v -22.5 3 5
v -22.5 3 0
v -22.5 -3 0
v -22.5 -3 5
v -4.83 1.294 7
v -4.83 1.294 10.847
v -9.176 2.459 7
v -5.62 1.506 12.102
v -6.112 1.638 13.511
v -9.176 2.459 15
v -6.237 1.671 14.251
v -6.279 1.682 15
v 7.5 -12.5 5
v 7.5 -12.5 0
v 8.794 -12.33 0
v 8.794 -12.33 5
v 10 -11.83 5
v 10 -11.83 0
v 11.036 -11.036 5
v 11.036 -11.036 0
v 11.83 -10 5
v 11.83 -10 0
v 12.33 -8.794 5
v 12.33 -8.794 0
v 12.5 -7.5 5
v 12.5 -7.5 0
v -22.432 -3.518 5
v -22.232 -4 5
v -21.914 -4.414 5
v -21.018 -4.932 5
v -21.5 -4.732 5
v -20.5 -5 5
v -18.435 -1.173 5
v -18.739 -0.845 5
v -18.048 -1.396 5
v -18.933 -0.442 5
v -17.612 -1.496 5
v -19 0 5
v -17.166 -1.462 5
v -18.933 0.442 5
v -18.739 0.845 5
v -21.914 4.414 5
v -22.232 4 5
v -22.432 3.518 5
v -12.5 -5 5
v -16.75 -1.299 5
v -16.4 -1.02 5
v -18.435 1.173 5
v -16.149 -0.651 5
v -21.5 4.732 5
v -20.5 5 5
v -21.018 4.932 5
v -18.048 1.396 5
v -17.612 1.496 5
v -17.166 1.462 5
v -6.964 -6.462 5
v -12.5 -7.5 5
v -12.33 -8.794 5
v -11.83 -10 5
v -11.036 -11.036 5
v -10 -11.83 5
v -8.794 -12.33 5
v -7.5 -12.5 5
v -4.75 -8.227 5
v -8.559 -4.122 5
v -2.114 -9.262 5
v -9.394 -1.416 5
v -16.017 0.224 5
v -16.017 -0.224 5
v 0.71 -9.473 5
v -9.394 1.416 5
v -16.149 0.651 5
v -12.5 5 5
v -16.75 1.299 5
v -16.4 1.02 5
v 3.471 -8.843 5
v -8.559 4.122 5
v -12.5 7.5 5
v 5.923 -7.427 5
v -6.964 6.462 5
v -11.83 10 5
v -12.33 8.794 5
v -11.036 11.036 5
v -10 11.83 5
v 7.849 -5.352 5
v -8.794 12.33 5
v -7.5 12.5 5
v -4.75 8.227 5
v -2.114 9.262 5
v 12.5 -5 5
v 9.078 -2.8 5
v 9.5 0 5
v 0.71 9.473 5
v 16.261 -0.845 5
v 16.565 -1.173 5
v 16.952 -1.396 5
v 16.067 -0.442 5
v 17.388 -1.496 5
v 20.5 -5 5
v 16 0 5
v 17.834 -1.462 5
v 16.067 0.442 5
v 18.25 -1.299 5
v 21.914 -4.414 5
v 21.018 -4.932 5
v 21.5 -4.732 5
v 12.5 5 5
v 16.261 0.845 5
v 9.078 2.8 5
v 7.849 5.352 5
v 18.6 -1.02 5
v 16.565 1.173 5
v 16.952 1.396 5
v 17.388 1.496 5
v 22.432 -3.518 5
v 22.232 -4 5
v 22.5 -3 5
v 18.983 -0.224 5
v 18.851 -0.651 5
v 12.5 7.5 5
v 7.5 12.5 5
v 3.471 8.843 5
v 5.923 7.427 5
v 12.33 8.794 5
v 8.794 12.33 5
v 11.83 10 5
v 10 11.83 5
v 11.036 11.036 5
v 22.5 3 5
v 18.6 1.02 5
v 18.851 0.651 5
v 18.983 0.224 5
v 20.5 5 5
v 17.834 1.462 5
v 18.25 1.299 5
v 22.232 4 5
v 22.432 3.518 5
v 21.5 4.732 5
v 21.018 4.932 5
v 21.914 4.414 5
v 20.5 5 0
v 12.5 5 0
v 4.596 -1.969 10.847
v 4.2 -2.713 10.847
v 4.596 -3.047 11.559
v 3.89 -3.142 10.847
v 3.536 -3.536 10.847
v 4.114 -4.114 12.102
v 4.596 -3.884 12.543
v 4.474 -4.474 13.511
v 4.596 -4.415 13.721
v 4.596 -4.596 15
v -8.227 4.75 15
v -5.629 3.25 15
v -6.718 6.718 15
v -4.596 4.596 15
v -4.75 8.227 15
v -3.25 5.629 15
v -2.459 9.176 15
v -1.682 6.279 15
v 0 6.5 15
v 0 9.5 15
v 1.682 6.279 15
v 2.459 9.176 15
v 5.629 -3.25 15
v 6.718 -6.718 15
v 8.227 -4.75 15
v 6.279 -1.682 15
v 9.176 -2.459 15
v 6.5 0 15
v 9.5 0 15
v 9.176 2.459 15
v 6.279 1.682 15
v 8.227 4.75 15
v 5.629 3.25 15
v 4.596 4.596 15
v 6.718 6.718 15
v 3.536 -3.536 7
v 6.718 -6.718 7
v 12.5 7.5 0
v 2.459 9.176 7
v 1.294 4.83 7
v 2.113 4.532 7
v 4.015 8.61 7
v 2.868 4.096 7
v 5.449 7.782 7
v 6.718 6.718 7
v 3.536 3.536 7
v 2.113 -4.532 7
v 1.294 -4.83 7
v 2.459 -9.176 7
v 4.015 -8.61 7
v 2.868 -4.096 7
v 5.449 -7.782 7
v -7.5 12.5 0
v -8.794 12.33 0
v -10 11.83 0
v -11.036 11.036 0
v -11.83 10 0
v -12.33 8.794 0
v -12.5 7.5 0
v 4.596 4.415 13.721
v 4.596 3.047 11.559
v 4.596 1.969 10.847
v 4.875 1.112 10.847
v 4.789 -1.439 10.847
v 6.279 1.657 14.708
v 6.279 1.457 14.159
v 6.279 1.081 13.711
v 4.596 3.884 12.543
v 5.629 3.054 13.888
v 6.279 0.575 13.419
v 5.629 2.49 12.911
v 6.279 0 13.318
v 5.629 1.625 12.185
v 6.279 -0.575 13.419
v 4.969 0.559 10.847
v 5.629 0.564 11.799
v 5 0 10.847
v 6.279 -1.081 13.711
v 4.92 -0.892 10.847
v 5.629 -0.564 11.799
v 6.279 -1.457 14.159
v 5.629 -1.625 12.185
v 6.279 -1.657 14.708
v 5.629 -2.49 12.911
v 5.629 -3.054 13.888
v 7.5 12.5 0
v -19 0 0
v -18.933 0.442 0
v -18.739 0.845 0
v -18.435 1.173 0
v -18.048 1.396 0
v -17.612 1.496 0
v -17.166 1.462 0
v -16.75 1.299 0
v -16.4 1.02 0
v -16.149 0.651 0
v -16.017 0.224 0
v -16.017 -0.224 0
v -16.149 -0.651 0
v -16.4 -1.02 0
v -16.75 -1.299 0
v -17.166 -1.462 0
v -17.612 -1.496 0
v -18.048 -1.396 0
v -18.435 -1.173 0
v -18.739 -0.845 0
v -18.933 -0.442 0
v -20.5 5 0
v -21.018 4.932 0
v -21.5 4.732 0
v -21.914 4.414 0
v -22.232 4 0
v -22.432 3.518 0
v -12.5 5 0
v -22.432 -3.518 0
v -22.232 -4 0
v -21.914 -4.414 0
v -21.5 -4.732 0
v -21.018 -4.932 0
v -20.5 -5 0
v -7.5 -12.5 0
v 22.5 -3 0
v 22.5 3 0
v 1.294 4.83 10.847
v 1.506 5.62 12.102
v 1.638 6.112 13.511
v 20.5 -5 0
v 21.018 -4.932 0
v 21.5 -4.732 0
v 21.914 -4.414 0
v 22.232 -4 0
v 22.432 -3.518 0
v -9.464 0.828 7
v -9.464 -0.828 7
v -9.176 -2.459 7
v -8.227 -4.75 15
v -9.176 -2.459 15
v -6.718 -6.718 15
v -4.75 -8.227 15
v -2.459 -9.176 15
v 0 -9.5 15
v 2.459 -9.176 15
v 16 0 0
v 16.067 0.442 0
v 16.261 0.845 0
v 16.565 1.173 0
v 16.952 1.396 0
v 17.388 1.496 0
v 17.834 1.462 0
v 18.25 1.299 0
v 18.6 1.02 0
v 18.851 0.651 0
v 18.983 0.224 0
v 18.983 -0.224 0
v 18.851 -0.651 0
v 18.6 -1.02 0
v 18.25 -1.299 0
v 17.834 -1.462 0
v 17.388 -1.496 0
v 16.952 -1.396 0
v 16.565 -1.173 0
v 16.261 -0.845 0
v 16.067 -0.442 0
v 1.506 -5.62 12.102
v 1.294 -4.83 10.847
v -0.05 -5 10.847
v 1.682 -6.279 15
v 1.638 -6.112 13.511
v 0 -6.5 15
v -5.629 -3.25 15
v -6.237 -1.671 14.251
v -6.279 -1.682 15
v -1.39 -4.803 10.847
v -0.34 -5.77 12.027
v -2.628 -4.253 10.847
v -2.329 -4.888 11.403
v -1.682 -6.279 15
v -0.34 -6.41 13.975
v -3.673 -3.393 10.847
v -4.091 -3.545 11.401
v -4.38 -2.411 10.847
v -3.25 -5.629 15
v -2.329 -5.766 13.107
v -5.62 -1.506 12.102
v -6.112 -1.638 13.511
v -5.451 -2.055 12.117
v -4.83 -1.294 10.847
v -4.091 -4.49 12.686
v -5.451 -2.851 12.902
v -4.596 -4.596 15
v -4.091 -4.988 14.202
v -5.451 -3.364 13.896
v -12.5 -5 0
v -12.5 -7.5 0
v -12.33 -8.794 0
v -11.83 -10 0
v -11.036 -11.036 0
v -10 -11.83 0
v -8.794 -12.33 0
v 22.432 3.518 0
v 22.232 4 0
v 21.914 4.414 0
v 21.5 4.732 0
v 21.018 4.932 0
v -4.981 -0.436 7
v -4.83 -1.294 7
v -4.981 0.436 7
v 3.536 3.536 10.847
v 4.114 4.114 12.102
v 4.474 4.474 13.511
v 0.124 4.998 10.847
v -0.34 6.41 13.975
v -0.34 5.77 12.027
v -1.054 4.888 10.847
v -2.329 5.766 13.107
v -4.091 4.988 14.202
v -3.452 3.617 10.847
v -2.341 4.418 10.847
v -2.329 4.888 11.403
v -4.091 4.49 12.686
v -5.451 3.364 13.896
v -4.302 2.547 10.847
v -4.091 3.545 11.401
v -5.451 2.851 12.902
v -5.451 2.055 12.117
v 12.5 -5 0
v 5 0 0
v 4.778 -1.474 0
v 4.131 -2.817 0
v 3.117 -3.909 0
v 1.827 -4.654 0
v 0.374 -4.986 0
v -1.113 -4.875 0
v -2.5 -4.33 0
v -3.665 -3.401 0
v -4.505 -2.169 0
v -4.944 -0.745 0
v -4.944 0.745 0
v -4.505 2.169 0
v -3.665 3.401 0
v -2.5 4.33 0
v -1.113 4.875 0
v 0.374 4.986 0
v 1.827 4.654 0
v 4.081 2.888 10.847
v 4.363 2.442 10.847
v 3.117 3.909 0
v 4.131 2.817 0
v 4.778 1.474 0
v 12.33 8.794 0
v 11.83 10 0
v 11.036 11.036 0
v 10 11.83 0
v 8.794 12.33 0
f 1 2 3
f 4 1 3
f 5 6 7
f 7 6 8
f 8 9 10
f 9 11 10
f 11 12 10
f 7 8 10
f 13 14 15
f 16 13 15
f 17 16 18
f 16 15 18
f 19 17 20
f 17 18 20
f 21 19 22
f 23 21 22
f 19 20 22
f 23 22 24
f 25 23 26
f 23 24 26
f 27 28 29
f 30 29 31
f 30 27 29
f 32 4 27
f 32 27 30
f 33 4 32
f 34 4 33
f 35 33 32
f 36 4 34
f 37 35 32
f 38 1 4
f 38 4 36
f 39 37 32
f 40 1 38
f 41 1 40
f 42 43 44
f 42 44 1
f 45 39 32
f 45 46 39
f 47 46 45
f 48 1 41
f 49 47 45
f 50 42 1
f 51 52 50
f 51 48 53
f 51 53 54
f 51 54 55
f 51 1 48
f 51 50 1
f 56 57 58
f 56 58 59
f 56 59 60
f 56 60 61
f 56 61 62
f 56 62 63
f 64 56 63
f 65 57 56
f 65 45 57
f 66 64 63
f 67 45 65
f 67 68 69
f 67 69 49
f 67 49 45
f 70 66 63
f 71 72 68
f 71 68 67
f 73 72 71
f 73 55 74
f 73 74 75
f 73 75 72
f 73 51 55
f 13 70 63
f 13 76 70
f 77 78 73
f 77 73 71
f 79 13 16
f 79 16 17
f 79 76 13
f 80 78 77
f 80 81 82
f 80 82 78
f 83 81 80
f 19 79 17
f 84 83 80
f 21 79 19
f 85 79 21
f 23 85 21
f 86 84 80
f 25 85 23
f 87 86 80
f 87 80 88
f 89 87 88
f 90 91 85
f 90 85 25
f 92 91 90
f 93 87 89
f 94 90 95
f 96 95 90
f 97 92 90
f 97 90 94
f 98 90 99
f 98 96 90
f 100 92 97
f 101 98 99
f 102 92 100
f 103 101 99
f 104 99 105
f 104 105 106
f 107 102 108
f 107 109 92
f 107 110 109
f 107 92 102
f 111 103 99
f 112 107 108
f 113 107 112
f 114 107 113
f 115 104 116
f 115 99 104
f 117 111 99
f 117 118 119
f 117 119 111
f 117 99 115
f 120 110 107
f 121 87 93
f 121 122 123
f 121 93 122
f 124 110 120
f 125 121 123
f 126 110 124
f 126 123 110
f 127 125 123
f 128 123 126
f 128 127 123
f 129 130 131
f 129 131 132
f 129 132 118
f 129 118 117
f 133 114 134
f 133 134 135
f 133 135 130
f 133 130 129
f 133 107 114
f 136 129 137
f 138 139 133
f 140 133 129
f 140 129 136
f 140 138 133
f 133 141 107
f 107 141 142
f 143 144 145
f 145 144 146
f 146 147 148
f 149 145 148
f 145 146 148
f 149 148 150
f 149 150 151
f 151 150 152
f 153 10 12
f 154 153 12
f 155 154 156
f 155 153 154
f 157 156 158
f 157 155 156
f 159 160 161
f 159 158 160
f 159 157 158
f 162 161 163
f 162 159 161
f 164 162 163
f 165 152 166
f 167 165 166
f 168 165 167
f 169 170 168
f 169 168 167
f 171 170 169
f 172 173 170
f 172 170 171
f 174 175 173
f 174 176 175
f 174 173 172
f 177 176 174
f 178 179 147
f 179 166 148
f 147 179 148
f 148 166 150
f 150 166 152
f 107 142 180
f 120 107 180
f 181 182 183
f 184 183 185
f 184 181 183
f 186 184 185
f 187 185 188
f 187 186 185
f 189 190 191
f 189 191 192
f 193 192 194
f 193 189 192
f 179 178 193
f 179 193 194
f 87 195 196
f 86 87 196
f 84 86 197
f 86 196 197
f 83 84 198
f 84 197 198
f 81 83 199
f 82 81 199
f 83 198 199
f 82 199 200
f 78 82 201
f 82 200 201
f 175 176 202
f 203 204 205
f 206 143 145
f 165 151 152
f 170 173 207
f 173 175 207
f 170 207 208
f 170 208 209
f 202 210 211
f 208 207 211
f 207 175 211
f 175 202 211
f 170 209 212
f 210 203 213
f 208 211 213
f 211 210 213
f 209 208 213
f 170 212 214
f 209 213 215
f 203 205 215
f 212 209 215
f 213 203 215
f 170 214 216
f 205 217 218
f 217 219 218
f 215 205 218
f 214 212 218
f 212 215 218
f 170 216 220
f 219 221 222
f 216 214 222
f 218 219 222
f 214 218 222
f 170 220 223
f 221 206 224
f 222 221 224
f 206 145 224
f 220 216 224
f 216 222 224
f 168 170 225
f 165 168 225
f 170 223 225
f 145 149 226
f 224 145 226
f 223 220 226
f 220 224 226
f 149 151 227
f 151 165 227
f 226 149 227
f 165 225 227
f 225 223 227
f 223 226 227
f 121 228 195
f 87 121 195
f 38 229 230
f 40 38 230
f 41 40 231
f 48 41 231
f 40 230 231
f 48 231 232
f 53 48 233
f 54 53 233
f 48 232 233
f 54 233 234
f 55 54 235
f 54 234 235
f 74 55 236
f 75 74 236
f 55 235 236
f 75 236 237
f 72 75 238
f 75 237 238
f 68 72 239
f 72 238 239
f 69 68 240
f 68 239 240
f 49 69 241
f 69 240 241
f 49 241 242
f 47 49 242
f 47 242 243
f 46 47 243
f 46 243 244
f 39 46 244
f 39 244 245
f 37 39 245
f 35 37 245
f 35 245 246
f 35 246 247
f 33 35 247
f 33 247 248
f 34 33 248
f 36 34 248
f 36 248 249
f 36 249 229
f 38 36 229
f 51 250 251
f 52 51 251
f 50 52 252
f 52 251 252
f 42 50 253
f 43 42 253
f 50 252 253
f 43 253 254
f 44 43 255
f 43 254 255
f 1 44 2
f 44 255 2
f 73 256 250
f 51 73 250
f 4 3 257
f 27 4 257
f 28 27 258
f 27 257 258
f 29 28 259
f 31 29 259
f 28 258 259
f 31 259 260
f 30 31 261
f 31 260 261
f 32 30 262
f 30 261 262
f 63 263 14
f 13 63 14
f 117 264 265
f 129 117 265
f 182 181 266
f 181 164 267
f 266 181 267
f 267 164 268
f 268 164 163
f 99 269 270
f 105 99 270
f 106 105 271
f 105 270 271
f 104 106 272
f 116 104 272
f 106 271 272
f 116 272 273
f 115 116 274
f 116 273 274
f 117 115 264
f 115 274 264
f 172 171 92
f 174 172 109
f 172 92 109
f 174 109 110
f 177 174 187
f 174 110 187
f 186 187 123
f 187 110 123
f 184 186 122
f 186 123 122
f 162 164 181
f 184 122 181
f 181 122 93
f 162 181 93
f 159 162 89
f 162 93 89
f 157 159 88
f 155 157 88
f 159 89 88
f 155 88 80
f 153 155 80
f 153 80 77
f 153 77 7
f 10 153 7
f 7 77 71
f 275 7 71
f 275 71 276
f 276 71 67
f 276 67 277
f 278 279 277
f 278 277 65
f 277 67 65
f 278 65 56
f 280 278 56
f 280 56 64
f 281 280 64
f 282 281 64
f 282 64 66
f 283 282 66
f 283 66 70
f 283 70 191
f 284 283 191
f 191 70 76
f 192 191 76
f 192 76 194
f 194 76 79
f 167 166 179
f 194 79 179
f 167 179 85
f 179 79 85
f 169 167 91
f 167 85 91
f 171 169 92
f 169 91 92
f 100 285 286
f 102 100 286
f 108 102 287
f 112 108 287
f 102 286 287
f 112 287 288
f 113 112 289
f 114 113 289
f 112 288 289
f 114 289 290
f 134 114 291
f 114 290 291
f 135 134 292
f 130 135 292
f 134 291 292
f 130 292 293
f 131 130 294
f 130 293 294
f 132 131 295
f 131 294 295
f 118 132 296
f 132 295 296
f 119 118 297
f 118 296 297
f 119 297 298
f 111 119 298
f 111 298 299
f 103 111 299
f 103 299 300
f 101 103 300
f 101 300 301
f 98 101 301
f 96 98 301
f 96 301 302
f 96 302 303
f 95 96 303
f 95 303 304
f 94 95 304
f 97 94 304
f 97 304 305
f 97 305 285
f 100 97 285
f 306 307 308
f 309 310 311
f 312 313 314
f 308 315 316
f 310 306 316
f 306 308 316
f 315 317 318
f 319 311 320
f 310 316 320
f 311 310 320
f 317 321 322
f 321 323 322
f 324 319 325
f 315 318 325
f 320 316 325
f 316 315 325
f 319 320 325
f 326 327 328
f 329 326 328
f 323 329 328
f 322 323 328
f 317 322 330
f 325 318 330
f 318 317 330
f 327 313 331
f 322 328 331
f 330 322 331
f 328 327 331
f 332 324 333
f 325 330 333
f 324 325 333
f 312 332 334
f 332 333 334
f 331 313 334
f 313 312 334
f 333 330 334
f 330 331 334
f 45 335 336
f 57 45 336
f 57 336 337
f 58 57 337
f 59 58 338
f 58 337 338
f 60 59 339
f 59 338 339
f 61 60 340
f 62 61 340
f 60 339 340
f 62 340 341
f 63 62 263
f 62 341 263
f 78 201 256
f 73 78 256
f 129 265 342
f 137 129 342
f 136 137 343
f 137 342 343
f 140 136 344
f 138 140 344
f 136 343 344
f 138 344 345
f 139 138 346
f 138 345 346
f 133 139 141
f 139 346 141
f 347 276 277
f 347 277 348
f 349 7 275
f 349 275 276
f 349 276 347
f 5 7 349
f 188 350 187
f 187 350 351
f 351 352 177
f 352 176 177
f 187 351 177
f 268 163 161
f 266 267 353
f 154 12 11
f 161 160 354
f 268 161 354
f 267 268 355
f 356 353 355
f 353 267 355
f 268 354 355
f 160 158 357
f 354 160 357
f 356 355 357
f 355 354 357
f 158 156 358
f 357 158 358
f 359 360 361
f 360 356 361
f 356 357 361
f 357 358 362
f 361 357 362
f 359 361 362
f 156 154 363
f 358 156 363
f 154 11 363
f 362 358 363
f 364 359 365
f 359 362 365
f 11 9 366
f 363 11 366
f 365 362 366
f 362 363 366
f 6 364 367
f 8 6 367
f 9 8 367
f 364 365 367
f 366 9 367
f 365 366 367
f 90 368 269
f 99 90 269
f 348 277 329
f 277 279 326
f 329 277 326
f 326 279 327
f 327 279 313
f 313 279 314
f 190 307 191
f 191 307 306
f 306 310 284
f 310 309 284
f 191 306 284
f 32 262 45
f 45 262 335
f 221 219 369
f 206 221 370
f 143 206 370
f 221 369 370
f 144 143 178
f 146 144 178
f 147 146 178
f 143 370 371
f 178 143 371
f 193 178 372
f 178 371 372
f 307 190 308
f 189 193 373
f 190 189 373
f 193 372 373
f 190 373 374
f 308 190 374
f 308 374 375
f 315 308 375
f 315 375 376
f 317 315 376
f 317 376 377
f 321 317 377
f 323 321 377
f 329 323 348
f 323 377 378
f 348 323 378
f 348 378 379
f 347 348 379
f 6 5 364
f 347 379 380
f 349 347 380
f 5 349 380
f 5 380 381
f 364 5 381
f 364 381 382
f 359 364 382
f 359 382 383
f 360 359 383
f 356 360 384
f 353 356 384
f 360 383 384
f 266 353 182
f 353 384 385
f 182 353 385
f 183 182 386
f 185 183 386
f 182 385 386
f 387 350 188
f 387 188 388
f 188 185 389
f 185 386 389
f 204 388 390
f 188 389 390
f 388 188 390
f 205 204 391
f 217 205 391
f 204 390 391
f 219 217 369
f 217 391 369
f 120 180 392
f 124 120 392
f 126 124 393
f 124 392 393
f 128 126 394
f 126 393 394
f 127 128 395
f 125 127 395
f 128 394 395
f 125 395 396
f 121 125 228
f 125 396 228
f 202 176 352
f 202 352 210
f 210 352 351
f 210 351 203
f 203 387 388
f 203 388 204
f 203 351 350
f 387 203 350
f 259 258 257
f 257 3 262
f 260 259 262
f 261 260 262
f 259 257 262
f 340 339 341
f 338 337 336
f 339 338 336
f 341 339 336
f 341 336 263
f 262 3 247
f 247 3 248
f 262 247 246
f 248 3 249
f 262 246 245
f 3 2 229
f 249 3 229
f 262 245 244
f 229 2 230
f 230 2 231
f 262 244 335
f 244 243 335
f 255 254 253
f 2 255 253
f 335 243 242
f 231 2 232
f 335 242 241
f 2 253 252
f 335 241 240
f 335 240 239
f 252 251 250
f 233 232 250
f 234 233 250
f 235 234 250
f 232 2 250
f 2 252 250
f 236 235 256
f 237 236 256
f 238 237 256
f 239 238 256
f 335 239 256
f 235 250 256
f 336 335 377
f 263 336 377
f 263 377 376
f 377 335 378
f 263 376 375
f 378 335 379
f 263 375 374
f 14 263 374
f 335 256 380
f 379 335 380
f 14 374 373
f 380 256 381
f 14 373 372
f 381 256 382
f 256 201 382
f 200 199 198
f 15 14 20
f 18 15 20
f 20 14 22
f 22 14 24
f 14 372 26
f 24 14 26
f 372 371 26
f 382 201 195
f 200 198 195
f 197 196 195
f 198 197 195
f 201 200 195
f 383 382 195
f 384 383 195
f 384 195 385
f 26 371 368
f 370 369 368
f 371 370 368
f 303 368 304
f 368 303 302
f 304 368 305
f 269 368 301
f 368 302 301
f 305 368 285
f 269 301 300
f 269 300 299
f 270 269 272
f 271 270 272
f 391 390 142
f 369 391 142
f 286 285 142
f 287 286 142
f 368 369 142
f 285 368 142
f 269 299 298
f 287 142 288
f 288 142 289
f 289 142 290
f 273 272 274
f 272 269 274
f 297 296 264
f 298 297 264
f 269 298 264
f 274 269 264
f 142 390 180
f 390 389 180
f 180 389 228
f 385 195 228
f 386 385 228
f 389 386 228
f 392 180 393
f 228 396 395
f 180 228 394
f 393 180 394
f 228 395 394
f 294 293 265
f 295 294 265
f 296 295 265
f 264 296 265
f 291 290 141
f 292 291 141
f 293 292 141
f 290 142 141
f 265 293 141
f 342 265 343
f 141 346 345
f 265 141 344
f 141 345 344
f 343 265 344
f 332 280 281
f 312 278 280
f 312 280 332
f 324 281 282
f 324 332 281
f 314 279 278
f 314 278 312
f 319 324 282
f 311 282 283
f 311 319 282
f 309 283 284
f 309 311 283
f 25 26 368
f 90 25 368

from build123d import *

# Parameters (mm, degrees)
F1_DEPTH  = 5
F3_D      = 3
F4_D      = 3
F2_R      = 9.5
F2_R_2    = 6.5
F5_DEPTH  = 10
F7_DEPTH  = 8
F9_ANGLE  = 180
F10_R     = 5
F11_DEPTH = 25


with BuildPart() as f1:
    # F0 (on Top) → F1 (new body)
    with BuildSketch(Plane.XY):
        with BuildLine():
            Line((-12.5, -5), (-12.5, 5))
            Line((-12.5, 5), (-20.5, 5))
            ThreePointArc((-20.5, 5), (-21.9142135624, 4.4142135624), (-22.5, 3))
            Line((-22.5, 3), (-22.5, -3))
            ThreePointArc((-22.5, -3), (-21.9142135624, -4.4142135624), (-20.5, -5))
            Line((-20.5, -5), (-12.5, -5))
        make_face()
        with BuildLine():
            Line((0, 12.5), (-7.5, 12.5))
            ThreePointArc((-7.5, 12.5), (-11.0355339059, 11.0355339059), (-12.5, 7.5))
            Line((-12.5, 7.5), (-12.5, 5))
            Line((-12.5, 5), (-12.5, -5))
            Line((-12.5, -5), (-12.5, -7.5))
            ThreePointArc((-12.5, -7.5), (-11.0355339059, -11.0355339059), (-7.5, -12.5))
            Line((-7.5, -12.5), (0, -12.5))
            Line((0, -12.5), (7.5, -12.5))
            ThreePointArc((7.5, -12.5), (11.0355339059, -11.0355339059), (12.5, -7.5))
            Line((12.5, -7.5), (12.5, -5))
            Line((12.5, -5), (12.5, 5))
            Line((12.5, 5), (12.5, 7.5))
            ThreePointArc((12.5, 7.5), (11.0355339059, 11.0355339059), (7.5, 12.5))
            Line((7.5, 12.5), (0, 12.5))
        make_face()
        with BuildLine():
            Line((20.5, 5), (12.5, 5))
            Line((12.5, 5), (12.5, -5))
            Line((12.5, -5), (20.5, -5))
            ThreePointArc((20.5, -5), (21.9142135624, -4.4142135624), (22.5, -3))
            Line((22.5, -3), (22.5, 3))
            ThreePointArc((22.5, 3), (21.9142135624, 4.4142135624), (20.5, 5))
        make_face()
    extrude(amount=F1_DEPTH)

    # F3 (through all)
    with Locations(Plane.XY.offset(5)):
        with Locations((-17.5, 0)):
            Hole(F3_D / 2)

    # F4 (through all)
    with Locations(Plane.XY.offset(5)):
        with Locations((17.5, 0)):
            Hole(F4_D / 2)

    # F2 (on face) → F5 (join)
    with BuildSketch(Plane.XY.offset(5)):
        Circle(F2_R)
        Circle(F2_R_2, mode=Mode.SUBTRACT)
        Circle(F2_R_2)
    extrude(amount=F5_DEPTH)

    # F6 (on face) → F7 (cut)
    with BuildSketch(Plane.XY.offset(15)):
        with BuildLine():
            ThreePointArc((-4.8296291314, -1.2940952255), (-5, 0), (-4.8296291314, 1.2940952255))
            Line((-4.8296291314, 1.2940952255), (-9.1762953497, 2.4587809285))
            ThreePointArc((-9.1762953497, 2.4587809285), (-9.5, 0), (-9.1762953497, -2.4587809285))
            Line((-9.1762953497, -2.4587809285), (-4.8296291314, -1.2940952255))
        make_face()
        with BuildLine():
            Line((1.2940952255, -4.8296291314), (2.4587809285, -9.1762953497))
            ThreePointArc((2.4587809285, -9.1762953497), (4.75, -8.227241336), (6.7175144213, -6.7175144213))
            Line((6.7175144213, -6.7175144213), (3.5355339059, -3.5355339059))
            ThreePointArc((3.5355339059, -3.5355339059), (2.5, -4.3301270189), (1.2940952255, -4.8296291314))
        make_face()
        with BuildLine():
            Line((3.5355339059, 3.5355339059), (6.7175144213, 6.7175144213))
            ThreePointArc((6.7175144213, 6.7175144213), (4.75, 8.227241336), (2.4587809285, 9.1762953497))
            Line((2.4587809285, 9.1762953497), (1.2940952255, 4.8296291314))
            ThreePointArc((1.2940952255, 4.8296291314), (2.5, 4.3301270189), (3.5355339059, 3.5355339059))
        make_face()
    extrude(amount=-F7_DEPTH, mode=Mode.SUBTRACT)

    # F8 (on face) → F9 (revolve, cut)
    with BuildSketch(Plane.XY.offset(15)):
        with BuildLine():
            Line((-6.5, 0), (-5, 0))
            ThreePointArc((-5, 0), (-4.9572243069, 0.6526309611), (-4.8296291314, 1.2940952255))
            Line((-4.8296291314, 1.2940952255), (-6.2785178709, 1.6823237932))
            ThreePointArc((-6.2785178709, 1.6823237932), (-6.4443915989, 0.8484202494), (-6.5, 0))
        make_face()
        with BuildLine():
            Line((-5, 0), (6.5, 0))
            ThreePointArc((6.5, 0), (6.0052169613, 2.4874423104), (4.5961940777, 4.5961940777))
            Line((4.5961940777, 4.5961940777), (3.5355339059, 3.5355339059))
            ThreePointArc((3.5355339059, 3.5355339059), (2.5, 4.3301270189), (1.2940952255, 4.8296291314))
            Line((1.2940952255, 4.8296291314), (1.6823237932, 6.2785178709))
            ThreePointArc((1.6823237932, 6.2785178709), (-3.25, 5.6291651246), (-6.2785178709, 1.6823237932))
            Line((-6.2785178709, 1.6823237932), (-4.8296291314, 1.2940952255))
            ThreePointArc((-4.8296291314, 1.2940952255), (-4.9572243069, 0.6526309611), (-5, 0))
        make_face()
        with BuildLine():
            Line((3.5355339059, 3.5355339059), (4.5961940777, 4.5961940777))
            ThreePointArc((4.5961940777, 4.5961940777), (3.25, 5.6291651246), (1.6823237932, 6.2785178709))
            Line((1.6823237932, 6.2785178709), (1.2940952255, 4.8296291314))
            ThreePointArc((1.2940952255, 4.8296291314), (2.5, 4.3301270189), (3.5355339059, 3.5355339059))
        make_face()
    revolve(axis=Axis((0, 0, 15), (-1, 0, 0)), revolution_arc=F9_ANGLE, mode=Mode.SUBTRACT)

    # F10 (on face) → F11 (cut)
    with BuildSketch(Plane(origin=(0, 0, 0), x_dir=(1, 0, 0), z_dir=(0, 0, -1))):
        Circle(F10_R)
    extrude(amount=-F11_DEPTH, mode=Mode.SUBTRACT)


solid = f1.part
